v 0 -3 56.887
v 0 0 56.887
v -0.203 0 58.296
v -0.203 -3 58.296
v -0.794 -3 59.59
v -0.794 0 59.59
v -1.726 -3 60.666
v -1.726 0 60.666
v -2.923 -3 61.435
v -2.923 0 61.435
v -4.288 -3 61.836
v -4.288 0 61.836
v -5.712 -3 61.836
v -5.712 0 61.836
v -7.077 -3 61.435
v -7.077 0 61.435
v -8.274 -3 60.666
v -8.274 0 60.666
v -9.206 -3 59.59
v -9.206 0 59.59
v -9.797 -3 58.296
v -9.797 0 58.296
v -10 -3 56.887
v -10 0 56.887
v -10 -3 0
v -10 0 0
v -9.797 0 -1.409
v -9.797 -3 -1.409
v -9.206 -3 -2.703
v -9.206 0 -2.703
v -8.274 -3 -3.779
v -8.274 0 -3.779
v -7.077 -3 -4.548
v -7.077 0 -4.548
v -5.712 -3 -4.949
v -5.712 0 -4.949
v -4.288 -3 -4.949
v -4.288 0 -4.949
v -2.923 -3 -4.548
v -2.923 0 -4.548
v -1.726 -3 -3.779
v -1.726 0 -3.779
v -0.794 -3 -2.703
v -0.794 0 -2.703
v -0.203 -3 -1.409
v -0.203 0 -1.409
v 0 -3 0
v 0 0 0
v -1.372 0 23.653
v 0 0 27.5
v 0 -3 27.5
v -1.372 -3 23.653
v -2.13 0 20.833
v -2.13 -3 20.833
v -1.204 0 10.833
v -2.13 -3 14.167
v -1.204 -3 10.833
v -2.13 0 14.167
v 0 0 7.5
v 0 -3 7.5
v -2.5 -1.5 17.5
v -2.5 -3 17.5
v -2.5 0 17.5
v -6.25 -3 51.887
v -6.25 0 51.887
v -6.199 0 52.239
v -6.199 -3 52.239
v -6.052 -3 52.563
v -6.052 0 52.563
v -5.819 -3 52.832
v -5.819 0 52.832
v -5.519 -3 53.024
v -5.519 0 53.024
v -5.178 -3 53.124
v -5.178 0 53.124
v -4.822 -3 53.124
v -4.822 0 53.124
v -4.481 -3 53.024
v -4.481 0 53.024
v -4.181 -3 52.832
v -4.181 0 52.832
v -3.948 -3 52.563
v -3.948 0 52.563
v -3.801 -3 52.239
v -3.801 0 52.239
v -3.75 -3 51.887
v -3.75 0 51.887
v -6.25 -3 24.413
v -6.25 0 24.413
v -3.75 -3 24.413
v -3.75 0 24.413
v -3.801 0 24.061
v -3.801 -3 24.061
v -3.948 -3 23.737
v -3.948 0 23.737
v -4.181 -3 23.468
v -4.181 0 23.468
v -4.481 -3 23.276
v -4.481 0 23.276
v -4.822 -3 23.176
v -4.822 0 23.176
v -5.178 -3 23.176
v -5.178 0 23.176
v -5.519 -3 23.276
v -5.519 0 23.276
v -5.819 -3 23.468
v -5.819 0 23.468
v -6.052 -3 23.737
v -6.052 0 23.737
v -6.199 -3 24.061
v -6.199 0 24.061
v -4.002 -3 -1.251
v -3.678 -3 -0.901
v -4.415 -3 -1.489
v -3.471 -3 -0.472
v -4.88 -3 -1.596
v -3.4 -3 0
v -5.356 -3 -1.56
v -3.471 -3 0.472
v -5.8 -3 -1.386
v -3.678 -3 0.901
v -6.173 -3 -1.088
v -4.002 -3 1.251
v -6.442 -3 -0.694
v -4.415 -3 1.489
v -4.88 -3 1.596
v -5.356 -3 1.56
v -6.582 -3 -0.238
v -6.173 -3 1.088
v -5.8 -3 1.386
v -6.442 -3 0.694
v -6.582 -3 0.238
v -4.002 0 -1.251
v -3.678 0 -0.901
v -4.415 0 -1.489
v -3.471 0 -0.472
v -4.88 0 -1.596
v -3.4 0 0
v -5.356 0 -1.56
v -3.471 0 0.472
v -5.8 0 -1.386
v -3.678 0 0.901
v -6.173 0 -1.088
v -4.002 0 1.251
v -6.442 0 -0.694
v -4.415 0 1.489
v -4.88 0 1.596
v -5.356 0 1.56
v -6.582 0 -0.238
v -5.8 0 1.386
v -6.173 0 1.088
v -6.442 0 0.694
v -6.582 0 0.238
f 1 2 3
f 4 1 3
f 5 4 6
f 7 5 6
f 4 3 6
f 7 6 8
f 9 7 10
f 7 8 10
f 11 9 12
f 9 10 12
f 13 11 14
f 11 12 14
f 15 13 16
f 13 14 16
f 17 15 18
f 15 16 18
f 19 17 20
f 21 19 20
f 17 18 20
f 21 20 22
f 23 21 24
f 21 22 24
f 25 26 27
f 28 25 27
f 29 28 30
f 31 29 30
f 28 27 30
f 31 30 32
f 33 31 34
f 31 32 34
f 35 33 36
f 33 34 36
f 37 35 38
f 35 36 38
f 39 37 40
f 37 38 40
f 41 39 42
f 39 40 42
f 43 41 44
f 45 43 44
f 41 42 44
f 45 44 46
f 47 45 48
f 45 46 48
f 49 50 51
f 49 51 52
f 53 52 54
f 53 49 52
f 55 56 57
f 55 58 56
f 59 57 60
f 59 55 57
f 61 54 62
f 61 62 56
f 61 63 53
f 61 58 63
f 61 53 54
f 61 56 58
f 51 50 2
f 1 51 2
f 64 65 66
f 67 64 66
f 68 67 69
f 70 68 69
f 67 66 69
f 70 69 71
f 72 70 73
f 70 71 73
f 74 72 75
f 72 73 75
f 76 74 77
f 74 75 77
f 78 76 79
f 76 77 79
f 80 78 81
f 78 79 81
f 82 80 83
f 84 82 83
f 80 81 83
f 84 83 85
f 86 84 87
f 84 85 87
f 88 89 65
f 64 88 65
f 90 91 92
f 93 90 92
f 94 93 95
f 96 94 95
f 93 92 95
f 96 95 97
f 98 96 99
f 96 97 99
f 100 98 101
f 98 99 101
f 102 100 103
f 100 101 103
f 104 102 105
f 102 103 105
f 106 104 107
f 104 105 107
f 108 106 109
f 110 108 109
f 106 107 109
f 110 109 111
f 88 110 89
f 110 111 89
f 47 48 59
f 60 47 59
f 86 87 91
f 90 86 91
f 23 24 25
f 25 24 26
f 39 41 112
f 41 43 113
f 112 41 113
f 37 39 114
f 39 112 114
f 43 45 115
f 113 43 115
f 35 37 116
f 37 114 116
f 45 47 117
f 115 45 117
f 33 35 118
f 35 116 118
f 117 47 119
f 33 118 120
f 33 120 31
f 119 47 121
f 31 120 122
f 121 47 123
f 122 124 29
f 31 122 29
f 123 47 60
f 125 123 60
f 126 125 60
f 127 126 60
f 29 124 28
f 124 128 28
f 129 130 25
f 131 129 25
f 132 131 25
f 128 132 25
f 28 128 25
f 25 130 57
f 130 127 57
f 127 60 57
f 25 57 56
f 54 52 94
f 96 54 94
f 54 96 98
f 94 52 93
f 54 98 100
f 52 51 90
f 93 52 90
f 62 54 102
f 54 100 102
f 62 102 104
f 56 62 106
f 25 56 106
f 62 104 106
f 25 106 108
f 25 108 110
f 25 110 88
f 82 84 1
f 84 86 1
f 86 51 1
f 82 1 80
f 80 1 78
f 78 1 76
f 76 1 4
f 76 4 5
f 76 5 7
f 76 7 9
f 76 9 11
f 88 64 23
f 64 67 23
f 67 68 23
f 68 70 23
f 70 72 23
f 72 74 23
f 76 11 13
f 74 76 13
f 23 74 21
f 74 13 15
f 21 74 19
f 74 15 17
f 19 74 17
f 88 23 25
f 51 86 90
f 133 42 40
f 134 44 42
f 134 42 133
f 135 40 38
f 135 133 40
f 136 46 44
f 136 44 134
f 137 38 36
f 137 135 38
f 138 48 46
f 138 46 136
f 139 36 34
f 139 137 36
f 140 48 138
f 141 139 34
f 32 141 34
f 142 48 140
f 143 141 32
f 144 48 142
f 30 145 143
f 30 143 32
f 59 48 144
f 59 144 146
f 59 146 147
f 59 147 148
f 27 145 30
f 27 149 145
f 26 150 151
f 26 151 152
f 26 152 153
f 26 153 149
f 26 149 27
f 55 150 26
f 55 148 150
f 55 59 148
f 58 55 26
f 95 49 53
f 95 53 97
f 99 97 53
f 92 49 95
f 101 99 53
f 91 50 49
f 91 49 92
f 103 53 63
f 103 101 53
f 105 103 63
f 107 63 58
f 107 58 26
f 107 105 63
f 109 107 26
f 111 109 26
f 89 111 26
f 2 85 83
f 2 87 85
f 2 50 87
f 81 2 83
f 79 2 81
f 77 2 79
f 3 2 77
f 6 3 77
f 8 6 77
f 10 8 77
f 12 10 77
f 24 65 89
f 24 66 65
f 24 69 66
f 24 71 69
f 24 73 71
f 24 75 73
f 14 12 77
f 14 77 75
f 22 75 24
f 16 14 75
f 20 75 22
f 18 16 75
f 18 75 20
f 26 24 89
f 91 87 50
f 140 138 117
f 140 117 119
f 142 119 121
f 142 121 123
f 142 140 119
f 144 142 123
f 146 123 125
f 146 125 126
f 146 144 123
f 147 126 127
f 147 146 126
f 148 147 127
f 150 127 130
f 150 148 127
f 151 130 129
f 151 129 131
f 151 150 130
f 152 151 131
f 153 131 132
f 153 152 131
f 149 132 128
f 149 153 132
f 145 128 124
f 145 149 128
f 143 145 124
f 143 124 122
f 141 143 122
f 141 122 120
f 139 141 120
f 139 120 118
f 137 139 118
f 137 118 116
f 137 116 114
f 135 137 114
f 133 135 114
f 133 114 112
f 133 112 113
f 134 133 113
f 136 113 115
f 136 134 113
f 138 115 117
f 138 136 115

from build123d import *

# Parameters (mm, degrees)
F0_R     = 1.6
F1_DEPTH = 3


with BuildPart() as f1:
    # F0 (on Front) → F1 (new body)
    with BuildSketch(Plane.XZ):
        with BuildLine():
            add(Edge.make_bspline(
                [(0, 27.5), (-1.25, 24.166667), (-2.5, 20.833333), (-2.5, 17.5)],
                knots=[0, 0, 0, 0, 10.307764, 10.307764, 10.307764, 10.307764], degree=3))
            Line((0, 27.5), (0, 32.5))
            Line((0, 32.5), (0, 56.887164))
            ThreePointArc((0, 56.887164), (-5, 61.887164), (-10, 56.887164))
            Line((-10, 56.887164), (-10, 0))
            ThreePointArc((-10, 0), (-5, -5), (0, 0))
            Line((0, 0), (0, 7.5))
            add(Edge.make_bspline(
                [(-2.5, 17.5), (-2.5, 14.166667), (-1.25, 10.833333), (0, 7.5)],
                knots=[10.307764, 10.307764, 10.307764, 10.307764, 20.615528, 20.615528, 20.615528, 20.615528], degree=3))
        make_face()
        with Locations((-5, 0)):
            Circle(F0_R, mode=Mode.SUBTRACT)
        with BuildLine():
            Line((-6.25, 24.412836), (-6.25, 51.887164))
            ThreePointArc((-6.25, 51.887164), (-5, 53.137164), (-3.75, 51.887164))
            Line((-3.75, 51.887164), (-3.75, 24.412836))
            ThreePointArc((-3.75, 24.412836), (-5, 23.162836), (-6.25, 24.412836))
        make_face(mode=Mode.SUBTRACT)
    extrude(amount=F1_DEPTH)


solid = f1.part
